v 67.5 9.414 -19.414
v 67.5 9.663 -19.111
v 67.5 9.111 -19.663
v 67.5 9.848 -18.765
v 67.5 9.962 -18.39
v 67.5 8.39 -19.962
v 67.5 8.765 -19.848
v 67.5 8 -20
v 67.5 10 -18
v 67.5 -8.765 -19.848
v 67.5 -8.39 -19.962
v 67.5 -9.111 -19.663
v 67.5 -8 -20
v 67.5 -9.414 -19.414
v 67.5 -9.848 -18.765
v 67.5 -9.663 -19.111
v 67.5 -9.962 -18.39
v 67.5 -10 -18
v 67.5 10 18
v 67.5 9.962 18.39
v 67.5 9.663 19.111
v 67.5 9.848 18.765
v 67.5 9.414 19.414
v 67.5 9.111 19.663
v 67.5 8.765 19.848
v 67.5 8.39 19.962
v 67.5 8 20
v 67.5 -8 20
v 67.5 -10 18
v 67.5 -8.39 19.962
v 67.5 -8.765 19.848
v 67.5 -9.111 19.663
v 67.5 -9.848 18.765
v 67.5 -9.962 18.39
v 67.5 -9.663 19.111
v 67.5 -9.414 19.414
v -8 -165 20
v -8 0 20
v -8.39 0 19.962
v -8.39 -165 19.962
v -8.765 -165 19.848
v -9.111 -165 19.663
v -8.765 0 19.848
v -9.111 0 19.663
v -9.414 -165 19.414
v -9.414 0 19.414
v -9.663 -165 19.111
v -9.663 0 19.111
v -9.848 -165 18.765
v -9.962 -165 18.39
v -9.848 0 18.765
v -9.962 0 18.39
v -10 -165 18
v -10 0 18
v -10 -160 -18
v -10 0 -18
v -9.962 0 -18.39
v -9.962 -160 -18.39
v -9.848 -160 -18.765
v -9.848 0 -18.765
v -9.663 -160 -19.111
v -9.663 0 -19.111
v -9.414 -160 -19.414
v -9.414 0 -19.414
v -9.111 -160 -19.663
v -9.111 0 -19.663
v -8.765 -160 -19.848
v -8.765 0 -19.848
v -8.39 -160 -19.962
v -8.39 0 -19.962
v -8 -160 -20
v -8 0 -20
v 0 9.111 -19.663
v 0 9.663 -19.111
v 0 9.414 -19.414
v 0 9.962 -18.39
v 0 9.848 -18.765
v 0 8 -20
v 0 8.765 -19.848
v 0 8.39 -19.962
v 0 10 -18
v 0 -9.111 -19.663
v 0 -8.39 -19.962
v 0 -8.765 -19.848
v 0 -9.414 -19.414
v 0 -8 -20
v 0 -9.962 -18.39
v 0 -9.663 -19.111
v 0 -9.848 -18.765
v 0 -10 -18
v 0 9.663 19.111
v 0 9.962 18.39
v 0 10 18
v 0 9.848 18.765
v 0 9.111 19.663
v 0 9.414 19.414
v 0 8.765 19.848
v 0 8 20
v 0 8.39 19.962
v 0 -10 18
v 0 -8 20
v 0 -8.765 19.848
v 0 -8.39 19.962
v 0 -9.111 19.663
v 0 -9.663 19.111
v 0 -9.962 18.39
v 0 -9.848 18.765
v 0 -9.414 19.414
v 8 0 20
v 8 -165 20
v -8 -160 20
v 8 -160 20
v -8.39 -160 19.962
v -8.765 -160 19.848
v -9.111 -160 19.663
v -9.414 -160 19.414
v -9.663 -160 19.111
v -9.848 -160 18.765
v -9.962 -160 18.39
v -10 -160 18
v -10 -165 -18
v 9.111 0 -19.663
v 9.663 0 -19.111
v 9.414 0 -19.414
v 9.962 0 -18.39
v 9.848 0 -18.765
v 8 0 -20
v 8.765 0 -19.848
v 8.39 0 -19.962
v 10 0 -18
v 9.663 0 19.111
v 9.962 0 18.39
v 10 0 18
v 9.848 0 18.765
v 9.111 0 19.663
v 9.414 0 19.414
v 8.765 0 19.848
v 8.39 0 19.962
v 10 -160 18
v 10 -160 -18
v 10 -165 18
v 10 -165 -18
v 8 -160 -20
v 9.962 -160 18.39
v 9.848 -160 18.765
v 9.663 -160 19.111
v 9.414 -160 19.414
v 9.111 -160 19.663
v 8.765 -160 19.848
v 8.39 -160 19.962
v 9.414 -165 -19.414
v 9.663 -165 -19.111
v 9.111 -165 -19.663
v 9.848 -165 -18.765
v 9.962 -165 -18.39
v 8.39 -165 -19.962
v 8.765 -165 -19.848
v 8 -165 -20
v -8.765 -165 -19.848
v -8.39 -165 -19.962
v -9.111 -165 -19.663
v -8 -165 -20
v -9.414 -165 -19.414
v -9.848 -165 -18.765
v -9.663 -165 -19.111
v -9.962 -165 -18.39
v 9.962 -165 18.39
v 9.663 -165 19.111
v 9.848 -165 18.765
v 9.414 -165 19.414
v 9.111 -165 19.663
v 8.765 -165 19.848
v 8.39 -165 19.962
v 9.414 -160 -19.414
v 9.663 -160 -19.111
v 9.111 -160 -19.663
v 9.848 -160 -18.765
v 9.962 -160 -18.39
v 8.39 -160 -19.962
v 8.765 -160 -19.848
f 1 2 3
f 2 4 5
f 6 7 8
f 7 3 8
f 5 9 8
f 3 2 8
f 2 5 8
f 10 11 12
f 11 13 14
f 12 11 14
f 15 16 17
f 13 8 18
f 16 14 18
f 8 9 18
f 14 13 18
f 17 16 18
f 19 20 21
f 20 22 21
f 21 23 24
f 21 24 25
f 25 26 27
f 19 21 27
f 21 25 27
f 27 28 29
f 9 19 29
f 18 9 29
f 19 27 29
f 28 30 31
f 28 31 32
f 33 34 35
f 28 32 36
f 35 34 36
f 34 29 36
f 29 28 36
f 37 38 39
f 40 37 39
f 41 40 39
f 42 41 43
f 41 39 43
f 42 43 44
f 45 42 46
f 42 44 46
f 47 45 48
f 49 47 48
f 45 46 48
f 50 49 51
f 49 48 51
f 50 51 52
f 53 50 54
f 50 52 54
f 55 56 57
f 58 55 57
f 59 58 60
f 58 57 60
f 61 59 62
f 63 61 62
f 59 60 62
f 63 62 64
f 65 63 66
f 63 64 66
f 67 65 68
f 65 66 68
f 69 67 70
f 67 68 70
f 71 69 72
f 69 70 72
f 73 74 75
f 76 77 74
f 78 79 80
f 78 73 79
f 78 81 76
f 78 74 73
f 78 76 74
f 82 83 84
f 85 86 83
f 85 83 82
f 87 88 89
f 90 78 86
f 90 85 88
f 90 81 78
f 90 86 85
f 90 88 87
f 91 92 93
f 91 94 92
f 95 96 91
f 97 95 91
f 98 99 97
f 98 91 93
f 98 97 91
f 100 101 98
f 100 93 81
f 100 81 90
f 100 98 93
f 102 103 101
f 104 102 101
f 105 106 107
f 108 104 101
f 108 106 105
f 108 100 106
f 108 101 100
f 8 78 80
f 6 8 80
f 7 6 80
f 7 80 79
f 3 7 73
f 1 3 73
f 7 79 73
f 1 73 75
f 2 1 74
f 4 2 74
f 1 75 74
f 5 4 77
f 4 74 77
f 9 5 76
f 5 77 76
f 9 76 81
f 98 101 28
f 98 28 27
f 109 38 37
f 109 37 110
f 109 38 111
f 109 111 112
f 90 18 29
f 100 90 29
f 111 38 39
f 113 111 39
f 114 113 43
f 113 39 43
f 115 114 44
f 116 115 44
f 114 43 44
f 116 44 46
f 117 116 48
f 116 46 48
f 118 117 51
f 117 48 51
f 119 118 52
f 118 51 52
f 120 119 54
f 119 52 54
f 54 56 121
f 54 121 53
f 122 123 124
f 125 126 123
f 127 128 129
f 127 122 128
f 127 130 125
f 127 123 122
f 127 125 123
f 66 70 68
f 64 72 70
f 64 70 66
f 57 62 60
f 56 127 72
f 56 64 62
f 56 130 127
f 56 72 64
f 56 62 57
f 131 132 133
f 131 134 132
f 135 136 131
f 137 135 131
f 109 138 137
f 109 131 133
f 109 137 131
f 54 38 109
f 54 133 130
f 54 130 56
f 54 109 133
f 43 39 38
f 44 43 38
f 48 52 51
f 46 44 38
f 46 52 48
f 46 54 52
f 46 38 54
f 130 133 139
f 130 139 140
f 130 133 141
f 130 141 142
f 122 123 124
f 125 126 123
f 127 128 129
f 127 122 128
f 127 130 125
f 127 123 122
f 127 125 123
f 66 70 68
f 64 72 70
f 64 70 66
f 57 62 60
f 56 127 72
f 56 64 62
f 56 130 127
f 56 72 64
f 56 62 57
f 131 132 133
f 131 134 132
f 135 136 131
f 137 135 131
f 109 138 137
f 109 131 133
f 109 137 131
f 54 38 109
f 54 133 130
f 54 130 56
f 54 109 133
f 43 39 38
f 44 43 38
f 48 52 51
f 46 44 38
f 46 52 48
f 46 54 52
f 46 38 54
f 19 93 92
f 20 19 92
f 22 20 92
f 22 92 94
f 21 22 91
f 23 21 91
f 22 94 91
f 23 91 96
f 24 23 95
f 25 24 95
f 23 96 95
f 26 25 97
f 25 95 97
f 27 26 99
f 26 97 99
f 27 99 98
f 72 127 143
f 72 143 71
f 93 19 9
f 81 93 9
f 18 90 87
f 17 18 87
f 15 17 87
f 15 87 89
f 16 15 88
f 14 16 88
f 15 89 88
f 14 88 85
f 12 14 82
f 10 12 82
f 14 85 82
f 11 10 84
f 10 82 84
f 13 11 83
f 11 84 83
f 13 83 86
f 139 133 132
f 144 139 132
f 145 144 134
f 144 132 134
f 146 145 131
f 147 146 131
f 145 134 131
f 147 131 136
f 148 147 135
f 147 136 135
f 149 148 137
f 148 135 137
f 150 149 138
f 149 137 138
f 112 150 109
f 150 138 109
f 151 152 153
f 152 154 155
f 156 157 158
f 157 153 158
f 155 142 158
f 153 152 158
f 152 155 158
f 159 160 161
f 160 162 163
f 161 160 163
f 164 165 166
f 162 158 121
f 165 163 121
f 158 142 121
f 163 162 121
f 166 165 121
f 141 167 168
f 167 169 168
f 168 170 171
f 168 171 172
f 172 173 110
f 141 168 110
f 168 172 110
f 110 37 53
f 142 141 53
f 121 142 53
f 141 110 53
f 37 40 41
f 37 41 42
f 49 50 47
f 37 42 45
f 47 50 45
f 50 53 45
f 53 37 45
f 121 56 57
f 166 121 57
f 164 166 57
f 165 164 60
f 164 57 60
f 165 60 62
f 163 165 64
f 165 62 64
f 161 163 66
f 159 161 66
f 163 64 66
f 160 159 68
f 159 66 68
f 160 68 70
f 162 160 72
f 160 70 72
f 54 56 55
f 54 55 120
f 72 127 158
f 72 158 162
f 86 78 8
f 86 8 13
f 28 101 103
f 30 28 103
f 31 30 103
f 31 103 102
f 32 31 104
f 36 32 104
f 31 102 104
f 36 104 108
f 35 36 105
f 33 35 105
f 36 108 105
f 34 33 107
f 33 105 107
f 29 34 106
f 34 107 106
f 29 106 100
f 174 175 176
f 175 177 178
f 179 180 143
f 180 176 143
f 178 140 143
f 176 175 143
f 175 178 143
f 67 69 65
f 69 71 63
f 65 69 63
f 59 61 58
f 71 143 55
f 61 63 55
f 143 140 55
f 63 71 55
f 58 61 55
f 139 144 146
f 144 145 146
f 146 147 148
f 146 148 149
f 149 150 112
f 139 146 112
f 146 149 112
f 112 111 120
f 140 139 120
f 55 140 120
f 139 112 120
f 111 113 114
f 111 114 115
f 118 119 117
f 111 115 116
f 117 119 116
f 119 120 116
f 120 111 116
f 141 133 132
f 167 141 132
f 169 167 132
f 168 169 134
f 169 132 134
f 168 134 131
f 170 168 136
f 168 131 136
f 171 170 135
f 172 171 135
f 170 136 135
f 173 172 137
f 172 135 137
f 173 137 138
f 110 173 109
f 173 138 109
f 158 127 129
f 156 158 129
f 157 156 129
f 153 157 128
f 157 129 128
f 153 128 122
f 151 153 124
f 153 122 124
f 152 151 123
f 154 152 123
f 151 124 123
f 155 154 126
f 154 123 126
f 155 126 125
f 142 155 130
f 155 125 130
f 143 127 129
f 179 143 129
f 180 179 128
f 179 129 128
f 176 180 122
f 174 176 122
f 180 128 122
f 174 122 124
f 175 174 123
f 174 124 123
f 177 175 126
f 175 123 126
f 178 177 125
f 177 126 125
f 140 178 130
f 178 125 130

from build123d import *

# Parameters (mm, degrees)
PAD_DEPTH    = 67.5
PAD001_DEPTH = 165
PAD002_DEPTH = 160


with BuildPart() as frontbridgebody:
    # Sketch → Pad (new body)
    with BuildSketch(Plane.YZ):
        with BuildLine():
            Line((-8, 20), (8, 20))
            ThreePointArc((10, 18), (9.414214, 19.414214), (8, 20))
            Line((10, 18), (10, -18))
            ThreePointArc((8, -20), (9.414214, -19.414214), (10, -18))
            Line((8, -20), (-8, -20))
            ThreePointArc((-10, -18), (-9.414214, -19.414214), (-8, -20))
            Line((-10, -18), (-10, 18))
            ThreePointArc((-8, 20), (-9.414214, 19.414214), (-10, 18))
        make_face()
    extrude(amount=PAD_DEPTH)


with BuildPart() as body_bridge_side:
    # Sketch001 → Pad001 (new body)
    with BuildSketch(Plane.XZ):
        with BuildLine():
            Line((-8, 20), (8, 20))
            ThreePointArc((10, 18), (9.414214, 19.414214), (8, 20))
            Line((10, 18), (10, -18))
            ThreePointArc((8, -20), (9.414214, -19.414214), (10, -18))
            Line((8, -20), (-8, -20))
            ThreePointArc((-10, -18), (-9.414214, -19.414214), (-8, -20))
            Line((-10, -18), (-10, 18))
            ThreePointArc((-8, 20), (-9.414214, 19.414214), (-10, 18))
        make_face()
    extrude(amount=PAD001_DEPTH)


with BuildPart() as body_bridge_back:
    # Sketch002 → Pad002 (new body)
    with BuildSketch(Plane.XZ):
        with BuildLine():
            Line((-8, 20), (8, 20))
            ThreePointArc((10, 18), (9.414214, 19.414214), (8, 20))
            Line((10, 18), (10, -18))
            ThreePointArc((8, -20), (9.414214, -19.414214), (10, -18))
            Line((8, -20), (-8, -20))
            ThreePointArc((-10, -18), (-9.414214, -19.414214), (-8, -20))
            Line((-10, -18), (-10, 18))
            ThreePointArc((-8, 20), (-9.414214, 19.414214), (-10, 18))
        make_face()
    extrude(amount=PAD002_DEPTH)


solid = Compound([frontbridgebody.part, body_bridge_side.part, body_bridge_back.part])
